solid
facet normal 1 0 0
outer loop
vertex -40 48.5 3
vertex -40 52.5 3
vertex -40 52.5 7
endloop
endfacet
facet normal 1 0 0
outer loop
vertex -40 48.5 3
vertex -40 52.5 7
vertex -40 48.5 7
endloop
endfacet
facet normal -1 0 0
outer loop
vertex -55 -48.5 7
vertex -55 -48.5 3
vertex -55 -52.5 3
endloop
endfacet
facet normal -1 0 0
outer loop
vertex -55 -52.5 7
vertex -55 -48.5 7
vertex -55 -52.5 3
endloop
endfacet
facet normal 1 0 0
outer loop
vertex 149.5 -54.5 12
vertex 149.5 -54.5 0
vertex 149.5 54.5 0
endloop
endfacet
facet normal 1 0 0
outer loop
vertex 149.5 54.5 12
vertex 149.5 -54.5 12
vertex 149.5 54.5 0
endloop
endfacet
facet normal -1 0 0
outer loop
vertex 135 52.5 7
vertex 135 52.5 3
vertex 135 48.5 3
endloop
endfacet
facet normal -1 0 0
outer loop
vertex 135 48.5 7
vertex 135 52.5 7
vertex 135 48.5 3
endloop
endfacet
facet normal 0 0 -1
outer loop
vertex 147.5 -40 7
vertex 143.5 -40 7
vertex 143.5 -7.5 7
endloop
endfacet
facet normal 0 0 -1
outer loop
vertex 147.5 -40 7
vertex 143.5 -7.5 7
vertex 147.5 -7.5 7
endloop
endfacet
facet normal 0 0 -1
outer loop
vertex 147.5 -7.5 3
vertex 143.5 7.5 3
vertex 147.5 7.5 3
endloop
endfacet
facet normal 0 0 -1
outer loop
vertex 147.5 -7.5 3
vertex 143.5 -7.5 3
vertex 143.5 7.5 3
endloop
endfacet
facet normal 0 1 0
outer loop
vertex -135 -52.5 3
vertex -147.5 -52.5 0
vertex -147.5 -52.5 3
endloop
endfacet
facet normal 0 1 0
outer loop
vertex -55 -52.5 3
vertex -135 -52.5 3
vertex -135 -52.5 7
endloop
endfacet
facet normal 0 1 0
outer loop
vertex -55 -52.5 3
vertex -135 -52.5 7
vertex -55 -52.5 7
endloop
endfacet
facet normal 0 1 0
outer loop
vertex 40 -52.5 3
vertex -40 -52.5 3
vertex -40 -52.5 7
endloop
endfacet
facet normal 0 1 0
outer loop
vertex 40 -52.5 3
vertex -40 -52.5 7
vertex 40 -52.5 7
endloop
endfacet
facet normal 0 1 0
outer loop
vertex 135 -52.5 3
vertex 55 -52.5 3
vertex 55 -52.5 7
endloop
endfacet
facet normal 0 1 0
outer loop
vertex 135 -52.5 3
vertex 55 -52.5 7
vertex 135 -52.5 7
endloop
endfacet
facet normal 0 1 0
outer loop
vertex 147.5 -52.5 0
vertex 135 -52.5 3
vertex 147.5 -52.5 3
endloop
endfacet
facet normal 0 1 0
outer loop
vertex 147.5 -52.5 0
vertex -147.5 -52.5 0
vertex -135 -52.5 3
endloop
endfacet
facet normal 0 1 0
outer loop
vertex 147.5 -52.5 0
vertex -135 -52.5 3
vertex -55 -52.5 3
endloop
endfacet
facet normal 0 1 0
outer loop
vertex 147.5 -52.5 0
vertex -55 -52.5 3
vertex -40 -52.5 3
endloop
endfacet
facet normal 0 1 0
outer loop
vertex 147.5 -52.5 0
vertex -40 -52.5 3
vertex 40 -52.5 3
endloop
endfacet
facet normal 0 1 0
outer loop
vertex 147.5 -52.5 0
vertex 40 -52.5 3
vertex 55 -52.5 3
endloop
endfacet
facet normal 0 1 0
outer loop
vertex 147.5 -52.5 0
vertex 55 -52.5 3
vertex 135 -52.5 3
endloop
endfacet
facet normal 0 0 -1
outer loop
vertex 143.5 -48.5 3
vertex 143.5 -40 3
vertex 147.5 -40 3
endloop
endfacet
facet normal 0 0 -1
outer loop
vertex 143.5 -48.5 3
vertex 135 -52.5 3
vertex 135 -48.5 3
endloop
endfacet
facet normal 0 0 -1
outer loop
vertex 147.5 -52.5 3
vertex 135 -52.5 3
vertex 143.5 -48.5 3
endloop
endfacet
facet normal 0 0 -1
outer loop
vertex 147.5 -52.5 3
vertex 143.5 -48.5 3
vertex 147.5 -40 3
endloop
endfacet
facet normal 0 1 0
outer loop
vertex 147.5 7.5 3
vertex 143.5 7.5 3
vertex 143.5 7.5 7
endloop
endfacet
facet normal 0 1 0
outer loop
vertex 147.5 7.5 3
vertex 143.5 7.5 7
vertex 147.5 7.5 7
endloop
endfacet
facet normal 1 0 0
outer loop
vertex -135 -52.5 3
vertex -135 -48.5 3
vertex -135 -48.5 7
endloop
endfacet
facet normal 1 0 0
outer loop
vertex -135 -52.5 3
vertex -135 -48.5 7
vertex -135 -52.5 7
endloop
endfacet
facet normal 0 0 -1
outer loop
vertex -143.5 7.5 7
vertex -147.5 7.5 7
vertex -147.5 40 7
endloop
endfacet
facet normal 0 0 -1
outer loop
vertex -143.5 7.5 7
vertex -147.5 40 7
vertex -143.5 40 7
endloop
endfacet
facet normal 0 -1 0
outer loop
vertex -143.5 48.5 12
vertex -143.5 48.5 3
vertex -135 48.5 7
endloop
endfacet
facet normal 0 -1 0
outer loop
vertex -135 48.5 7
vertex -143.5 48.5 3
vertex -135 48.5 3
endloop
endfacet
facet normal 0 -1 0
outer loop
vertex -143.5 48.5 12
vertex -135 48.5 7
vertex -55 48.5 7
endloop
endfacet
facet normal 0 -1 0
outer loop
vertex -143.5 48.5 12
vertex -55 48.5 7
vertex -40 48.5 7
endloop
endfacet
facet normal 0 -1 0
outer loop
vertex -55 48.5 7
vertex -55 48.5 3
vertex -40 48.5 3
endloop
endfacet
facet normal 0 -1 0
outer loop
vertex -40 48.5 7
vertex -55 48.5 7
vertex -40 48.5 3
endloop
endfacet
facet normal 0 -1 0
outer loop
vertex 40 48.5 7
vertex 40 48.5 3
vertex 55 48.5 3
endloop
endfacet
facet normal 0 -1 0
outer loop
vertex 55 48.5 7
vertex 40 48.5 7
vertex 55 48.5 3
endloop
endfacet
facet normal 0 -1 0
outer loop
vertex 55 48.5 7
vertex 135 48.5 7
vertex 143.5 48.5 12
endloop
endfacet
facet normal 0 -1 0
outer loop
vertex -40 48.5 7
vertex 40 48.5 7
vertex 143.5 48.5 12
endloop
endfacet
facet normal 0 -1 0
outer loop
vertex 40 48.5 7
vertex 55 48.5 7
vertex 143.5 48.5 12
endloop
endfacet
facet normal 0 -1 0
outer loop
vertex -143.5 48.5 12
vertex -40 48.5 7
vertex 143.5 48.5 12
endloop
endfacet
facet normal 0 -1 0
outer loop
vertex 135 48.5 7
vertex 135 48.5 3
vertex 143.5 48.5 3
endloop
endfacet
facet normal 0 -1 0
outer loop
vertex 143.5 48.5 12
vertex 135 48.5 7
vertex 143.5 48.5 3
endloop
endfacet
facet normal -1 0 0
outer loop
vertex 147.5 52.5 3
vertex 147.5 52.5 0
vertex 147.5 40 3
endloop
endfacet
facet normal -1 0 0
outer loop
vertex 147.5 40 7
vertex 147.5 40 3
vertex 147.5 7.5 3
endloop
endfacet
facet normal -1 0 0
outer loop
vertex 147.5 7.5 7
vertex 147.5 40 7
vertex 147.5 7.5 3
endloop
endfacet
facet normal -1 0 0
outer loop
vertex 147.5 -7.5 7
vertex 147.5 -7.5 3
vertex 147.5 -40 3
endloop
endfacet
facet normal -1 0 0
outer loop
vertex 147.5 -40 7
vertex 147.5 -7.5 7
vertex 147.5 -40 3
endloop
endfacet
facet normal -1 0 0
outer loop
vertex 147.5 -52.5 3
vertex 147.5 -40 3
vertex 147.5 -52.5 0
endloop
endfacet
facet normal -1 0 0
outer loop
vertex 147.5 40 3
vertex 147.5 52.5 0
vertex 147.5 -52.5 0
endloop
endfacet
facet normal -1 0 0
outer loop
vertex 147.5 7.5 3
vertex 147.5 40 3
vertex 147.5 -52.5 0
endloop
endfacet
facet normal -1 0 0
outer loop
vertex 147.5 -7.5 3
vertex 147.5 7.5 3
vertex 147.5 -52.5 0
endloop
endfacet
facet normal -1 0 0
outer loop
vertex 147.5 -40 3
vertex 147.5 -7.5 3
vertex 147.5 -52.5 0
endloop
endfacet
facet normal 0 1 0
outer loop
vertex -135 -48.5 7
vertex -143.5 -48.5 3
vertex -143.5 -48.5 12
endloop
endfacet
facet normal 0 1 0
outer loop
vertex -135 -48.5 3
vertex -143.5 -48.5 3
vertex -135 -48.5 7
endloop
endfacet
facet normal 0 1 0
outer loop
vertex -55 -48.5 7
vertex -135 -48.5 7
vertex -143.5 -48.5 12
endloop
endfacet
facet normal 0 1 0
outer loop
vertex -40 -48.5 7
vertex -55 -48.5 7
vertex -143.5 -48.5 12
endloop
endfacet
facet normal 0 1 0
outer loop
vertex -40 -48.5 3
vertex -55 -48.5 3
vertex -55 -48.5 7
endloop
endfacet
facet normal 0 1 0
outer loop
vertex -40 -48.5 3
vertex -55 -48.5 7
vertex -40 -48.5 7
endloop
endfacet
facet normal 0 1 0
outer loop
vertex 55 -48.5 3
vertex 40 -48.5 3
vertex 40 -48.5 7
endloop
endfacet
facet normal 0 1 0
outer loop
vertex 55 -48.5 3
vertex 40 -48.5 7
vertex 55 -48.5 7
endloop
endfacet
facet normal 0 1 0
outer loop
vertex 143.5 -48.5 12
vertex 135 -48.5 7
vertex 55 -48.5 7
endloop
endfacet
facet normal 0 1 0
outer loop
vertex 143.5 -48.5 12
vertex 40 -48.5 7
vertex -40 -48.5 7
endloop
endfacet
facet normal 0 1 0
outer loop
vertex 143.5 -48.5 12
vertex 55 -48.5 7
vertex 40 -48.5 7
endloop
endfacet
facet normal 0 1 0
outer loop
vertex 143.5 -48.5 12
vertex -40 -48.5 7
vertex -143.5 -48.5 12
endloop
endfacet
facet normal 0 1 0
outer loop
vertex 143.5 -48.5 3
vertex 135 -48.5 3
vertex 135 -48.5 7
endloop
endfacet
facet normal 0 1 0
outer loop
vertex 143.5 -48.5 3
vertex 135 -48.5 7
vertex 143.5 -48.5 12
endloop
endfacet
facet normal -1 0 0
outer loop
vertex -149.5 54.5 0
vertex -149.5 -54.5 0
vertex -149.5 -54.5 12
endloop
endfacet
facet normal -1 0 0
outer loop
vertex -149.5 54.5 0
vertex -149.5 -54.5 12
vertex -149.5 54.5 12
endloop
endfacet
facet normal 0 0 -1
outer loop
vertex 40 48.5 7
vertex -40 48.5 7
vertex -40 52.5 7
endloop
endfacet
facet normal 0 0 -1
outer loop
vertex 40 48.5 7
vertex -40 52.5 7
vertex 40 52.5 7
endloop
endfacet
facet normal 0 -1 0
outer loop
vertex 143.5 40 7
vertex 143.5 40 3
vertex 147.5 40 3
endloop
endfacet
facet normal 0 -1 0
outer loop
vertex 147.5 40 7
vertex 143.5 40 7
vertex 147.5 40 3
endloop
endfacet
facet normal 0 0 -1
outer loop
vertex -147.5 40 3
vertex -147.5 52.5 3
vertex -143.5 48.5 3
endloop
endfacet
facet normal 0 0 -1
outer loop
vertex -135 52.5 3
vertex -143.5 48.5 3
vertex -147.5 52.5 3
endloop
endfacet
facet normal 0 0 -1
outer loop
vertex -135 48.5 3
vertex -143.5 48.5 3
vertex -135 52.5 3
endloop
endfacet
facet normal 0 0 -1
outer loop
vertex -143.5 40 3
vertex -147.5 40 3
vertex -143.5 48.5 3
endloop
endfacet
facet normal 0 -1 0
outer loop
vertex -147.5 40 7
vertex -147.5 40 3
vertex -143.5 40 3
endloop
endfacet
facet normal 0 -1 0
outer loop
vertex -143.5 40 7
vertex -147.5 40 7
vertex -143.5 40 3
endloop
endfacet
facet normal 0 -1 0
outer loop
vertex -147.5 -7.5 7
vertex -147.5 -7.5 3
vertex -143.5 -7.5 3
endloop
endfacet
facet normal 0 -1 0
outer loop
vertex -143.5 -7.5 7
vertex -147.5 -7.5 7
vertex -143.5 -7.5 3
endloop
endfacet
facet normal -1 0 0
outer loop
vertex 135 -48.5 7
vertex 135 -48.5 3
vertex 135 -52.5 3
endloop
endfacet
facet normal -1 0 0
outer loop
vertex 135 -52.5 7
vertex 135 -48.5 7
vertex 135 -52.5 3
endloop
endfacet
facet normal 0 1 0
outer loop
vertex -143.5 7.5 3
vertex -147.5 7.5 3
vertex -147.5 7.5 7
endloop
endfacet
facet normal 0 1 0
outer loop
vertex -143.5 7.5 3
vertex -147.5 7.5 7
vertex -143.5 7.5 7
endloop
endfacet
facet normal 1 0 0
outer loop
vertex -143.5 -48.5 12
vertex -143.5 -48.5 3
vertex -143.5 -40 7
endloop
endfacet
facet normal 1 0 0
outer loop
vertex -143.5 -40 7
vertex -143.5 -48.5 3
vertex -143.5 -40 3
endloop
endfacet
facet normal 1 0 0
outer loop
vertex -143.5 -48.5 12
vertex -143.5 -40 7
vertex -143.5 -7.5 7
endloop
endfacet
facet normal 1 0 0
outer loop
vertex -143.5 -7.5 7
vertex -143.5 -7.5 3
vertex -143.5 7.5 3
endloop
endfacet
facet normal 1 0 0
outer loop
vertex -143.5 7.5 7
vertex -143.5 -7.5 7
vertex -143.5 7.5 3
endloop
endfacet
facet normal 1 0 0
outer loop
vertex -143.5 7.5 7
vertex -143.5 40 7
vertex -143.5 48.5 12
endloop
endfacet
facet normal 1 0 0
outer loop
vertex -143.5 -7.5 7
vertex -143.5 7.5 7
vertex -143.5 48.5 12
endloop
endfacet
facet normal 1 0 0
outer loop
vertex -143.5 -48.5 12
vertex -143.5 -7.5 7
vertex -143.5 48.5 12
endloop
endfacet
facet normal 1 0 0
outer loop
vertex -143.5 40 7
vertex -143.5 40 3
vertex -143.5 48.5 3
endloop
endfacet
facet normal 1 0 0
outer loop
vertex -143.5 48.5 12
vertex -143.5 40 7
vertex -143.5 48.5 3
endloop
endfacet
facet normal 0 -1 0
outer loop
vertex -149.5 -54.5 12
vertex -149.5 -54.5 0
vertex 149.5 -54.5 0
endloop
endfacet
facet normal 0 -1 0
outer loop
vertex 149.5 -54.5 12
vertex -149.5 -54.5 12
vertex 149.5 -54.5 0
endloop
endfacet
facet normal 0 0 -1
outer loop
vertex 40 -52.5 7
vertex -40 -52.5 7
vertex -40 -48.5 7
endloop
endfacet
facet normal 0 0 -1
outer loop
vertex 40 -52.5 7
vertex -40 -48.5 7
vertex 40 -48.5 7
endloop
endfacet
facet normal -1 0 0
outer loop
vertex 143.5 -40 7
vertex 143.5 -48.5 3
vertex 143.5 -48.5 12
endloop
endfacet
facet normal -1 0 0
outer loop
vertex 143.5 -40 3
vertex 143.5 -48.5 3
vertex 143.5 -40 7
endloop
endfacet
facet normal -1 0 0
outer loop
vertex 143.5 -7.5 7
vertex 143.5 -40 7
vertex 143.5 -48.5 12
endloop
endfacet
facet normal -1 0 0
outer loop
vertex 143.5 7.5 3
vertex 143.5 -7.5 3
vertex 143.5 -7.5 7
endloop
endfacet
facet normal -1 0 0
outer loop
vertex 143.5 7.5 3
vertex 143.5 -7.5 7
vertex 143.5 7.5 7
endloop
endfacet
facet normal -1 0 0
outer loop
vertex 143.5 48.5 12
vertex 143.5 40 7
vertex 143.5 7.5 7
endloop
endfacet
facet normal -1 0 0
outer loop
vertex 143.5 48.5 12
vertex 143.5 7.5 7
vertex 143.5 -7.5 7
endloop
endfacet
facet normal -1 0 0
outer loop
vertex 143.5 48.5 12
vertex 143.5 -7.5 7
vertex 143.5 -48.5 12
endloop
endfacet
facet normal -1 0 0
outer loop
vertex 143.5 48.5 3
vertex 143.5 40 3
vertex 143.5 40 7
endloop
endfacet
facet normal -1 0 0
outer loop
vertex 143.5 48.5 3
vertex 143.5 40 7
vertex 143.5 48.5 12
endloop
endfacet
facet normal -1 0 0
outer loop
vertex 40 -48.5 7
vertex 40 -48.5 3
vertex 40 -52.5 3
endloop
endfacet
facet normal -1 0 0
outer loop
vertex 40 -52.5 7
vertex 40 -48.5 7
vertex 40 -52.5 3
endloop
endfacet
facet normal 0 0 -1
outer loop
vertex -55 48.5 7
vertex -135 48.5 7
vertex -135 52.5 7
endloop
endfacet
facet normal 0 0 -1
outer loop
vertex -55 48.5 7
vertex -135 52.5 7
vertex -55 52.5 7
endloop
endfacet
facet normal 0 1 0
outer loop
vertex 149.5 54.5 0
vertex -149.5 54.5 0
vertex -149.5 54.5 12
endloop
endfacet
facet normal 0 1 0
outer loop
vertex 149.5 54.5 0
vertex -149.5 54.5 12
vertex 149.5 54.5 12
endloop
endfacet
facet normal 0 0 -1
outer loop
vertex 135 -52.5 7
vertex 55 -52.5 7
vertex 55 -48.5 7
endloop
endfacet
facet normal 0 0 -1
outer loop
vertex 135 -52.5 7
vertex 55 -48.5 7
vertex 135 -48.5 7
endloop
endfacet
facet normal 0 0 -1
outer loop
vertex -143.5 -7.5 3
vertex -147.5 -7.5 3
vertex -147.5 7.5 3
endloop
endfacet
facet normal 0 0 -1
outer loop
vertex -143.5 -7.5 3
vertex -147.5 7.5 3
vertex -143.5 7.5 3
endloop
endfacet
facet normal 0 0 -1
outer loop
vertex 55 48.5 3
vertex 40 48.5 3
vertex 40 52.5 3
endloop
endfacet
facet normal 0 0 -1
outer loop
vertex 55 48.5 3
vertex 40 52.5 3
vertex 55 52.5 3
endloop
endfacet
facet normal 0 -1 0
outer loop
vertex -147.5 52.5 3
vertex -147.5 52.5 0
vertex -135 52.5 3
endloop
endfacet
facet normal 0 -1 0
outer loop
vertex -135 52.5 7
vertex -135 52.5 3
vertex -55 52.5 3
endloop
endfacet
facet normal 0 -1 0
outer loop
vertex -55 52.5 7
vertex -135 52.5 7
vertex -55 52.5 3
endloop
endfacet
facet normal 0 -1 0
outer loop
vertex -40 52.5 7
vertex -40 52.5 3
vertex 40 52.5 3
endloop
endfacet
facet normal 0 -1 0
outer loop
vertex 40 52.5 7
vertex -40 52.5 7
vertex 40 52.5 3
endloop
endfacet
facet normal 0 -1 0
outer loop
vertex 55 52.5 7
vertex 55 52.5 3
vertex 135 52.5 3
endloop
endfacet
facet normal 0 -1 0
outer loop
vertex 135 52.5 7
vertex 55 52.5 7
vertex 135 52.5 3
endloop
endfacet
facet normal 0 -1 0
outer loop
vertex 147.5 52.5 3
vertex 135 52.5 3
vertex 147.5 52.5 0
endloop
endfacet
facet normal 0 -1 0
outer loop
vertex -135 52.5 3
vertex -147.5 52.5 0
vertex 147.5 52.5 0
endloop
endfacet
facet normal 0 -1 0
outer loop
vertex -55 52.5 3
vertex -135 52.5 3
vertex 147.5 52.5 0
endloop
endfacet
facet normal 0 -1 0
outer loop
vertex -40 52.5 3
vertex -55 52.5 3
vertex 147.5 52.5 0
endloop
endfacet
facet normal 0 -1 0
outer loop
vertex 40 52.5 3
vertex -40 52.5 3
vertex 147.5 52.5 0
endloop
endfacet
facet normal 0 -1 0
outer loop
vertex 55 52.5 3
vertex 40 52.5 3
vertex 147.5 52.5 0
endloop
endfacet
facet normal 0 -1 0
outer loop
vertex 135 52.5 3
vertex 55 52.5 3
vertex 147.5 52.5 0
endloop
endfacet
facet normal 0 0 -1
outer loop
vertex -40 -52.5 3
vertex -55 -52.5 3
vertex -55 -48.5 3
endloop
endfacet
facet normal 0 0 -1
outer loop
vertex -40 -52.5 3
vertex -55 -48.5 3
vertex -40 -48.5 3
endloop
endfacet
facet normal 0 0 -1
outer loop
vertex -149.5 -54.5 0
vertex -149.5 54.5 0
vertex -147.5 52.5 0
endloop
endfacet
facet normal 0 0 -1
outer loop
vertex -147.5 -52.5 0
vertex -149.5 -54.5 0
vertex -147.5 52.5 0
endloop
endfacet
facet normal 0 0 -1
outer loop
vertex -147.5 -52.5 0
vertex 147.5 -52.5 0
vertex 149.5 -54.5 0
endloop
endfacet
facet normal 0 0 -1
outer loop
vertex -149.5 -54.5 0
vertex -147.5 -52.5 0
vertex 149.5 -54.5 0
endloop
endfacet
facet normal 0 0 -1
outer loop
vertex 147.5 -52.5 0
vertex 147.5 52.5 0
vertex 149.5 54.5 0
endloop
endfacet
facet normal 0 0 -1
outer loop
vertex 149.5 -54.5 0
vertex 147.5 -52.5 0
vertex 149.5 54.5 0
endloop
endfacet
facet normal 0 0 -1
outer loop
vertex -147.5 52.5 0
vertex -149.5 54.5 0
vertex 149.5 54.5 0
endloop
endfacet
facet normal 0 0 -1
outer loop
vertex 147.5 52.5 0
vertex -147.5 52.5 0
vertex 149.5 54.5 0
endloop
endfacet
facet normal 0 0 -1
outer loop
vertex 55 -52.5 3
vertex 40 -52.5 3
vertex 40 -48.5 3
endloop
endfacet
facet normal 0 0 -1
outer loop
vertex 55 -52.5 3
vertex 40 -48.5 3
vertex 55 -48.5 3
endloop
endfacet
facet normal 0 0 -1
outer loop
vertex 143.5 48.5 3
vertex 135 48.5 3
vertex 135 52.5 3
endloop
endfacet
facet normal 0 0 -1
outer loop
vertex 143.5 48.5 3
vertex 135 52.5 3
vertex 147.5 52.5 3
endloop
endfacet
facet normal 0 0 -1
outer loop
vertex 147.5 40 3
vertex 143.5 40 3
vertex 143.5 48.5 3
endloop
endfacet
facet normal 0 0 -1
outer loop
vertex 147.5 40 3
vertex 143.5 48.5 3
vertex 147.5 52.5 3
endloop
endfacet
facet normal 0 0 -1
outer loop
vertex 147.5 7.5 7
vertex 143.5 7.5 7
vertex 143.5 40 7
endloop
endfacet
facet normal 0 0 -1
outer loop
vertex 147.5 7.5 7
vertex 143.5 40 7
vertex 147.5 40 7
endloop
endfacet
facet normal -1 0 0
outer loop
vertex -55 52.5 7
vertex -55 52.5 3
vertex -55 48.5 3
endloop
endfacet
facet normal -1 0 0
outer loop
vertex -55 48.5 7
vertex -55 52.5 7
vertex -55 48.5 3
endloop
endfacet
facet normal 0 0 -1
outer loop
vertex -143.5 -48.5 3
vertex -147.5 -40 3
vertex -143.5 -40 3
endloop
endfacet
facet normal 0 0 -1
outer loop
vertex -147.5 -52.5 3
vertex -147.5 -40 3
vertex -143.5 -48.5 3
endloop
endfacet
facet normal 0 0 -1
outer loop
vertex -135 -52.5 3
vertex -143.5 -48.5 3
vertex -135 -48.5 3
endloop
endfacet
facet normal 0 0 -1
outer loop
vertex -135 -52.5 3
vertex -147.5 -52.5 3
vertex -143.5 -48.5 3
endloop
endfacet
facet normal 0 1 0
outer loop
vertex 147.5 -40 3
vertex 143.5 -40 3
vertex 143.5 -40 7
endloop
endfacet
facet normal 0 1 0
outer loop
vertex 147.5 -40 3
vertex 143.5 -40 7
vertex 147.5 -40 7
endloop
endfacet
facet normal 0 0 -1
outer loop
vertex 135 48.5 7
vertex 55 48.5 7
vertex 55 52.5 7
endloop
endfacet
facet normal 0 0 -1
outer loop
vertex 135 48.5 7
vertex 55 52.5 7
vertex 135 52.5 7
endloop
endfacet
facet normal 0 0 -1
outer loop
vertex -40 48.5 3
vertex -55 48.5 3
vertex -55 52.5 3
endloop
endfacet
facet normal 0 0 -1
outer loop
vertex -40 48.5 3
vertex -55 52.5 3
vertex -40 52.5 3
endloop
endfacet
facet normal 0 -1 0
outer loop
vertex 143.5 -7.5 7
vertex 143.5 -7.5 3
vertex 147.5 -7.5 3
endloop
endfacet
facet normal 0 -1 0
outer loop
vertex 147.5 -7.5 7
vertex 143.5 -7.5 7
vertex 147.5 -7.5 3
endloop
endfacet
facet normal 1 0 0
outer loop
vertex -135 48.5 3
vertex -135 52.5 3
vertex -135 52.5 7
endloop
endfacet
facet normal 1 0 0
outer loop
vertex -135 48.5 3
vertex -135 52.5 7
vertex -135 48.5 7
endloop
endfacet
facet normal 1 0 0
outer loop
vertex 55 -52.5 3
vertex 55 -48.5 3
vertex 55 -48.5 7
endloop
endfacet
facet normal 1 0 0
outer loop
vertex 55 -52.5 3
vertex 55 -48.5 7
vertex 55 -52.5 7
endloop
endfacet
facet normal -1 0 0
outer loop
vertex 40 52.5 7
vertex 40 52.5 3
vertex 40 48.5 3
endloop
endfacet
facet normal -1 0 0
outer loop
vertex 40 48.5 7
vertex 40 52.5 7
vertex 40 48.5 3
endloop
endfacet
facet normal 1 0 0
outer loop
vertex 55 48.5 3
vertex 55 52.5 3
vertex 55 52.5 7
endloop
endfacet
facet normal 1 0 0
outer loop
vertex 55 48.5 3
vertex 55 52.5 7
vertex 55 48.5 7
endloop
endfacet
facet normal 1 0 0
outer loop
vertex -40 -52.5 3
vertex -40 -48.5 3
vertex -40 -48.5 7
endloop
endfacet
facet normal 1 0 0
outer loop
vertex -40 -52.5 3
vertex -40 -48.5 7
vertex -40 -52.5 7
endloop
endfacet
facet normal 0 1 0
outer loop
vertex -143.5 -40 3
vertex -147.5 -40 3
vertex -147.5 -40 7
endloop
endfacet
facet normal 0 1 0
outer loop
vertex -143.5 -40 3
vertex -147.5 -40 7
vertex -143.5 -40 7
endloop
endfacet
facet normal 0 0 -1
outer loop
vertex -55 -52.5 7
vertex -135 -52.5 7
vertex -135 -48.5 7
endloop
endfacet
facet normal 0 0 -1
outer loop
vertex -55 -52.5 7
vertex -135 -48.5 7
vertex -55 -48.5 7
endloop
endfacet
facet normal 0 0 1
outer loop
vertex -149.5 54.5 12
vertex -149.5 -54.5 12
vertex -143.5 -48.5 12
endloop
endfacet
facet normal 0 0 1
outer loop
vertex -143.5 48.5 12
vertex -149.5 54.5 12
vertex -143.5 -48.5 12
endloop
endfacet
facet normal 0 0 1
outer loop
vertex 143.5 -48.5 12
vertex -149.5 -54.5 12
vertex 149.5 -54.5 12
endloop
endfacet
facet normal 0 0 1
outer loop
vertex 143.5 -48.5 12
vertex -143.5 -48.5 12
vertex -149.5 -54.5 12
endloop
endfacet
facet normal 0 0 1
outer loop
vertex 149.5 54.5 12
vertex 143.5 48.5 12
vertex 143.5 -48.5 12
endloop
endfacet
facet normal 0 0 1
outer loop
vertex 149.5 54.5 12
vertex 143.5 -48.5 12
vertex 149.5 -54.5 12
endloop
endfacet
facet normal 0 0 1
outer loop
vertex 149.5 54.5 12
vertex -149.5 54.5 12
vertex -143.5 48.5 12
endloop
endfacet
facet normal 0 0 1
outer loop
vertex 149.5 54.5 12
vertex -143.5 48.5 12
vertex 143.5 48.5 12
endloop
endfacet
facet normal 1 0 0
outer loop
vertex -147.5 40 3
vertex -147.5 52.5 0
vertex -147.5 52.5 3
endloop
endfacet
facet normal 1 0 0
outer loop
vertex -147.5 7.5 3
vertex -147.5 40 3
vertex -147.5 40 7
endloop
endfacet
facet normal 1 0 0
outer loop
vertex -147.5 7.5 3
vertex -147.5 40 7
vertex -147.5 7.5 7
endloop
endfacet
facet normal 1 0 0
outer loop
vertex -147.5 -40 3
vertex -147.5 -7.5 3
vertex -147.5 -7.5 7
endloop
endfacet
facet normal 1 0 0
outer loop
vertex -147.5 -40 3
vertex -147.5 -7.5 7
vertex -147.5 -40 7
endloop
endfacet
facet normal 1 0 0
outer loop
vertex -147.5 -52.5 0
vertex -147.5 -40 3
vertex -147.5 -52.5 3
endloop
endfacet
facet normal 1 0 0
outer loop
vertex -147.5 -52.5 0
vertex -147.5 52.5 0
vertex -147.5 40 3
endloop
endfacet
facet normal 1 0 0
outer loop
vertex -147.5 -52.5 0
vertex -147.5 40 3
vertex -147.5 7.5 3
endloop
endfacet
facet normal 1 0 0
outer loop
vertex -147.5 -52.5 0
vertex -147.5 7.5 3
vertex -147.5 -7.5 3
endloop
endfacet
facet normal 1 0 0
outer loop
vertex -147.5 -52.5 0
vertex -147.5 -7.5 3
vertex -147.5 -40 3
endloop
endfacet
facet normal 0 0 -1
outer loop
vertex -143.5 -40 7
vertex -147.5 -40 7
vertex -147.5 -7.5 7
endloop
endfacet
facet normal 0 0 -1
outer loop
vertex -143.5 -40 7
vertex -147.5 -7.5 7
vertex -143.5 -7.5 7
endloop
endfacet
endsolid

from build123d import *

# Parameters (mm, degrees)
SKETCH001_W     = 299
SKETCH001_H     = 109
SKETCH001_W_2   = 287
SKETCH001_H_2   = 97
PAD_DEPTH       = 12
SKETCH002_W     = 295
SKETCH002_H     = 105
POCKET_DEPTH    = 3
SKETCH003_W     = 80
SKETCH003_H     = 4
POCKET001_DEPTH = 4
SKETCH004_W     = 4
SKETCH004_H     = 32.5
POCKET002_DEPTH = 4


with BuildPart() as part:
    # Sketch001 → Pad (new body)
    with BuildSketch(Plane.XY):
        Rectangle(SKETCH001_W, SKETCH001_H)
        Rectangle(SKETCH001_W_2, SKETCH001_H_2, mode=Mode.SUBTRACT)
    extrude(amount=PAD_DEPTH)

    # Sketch002 (on Face9 of Pad) → Pocket (cut)
    with BuildSketch(Plane(origin=(0, 0, 0), x_dir=(1, 0, 0), z_dir=(0, 0, -1))):
        Rectangle(SKETCH002_W, SKETCH002_H)
    extrude(amount=-POCKET_DEPTH, mode=Mode.SUBTRACT)

    # Sketch003 (on Face15 of Pocket) → Pocket001 (cut)
    with BuildSketch(Plane(origin=(0, 0, 3), x_dir=(1, 0, 0), z_dir=(0, 0, -1))):
        with Locations((-95, 50.5)):
            Rectangle(SKETCH003_W, SKETCH003_H)
        with Locations((0, 50.5)):
            Rectangle(SKETCH003_W, SKETCH003_H)
        with Locations((95, 50.5)):
            Rectangle(SKETCH003_W, SKETCH003_H)
        with Locations((-95, -50.5)):
            Rectangle(SKETCH003_W, SKETCH003_H)
        with Locations((0, -50.5)):
            Rectangle(SKETCH003_W, SKETCH003_H)
        with Locations((95, -50.5)):
            Rectangle(SKETCH003_W, SKETCH003_H)
    extrude(amount=-POCKET001_DEPTH, mode=Mode.SUBTRACT)

    # Sketch004 (on Face15 of Pocket001) → Pocket002 (cut)
    with BuildSketch(Plane(origin=(0, 0, 3), x_dir=(1, 0, 0), z_dir=(0, 0, -1))):
        with Locations((145.5, 23.75)):
            Rectangle(SKETCH004_W, SKETCH004_H)
        with Locations((145.5, -23.75)):
            Rectangle(SKETCH004_W, SKETCH004_H)
        with Locations((-145.5, 23.75)):
            Rectangle(SKETCH004_W, SKETCH004_H)
        with Locations((-145.5, -23.75)):
            Rectangle(SKETCH004_W, SKETCH004_H)
    extrude(amount=-POCKET002_DEPTH, mode=Mode.SUBTRACT)


solid = part.part
